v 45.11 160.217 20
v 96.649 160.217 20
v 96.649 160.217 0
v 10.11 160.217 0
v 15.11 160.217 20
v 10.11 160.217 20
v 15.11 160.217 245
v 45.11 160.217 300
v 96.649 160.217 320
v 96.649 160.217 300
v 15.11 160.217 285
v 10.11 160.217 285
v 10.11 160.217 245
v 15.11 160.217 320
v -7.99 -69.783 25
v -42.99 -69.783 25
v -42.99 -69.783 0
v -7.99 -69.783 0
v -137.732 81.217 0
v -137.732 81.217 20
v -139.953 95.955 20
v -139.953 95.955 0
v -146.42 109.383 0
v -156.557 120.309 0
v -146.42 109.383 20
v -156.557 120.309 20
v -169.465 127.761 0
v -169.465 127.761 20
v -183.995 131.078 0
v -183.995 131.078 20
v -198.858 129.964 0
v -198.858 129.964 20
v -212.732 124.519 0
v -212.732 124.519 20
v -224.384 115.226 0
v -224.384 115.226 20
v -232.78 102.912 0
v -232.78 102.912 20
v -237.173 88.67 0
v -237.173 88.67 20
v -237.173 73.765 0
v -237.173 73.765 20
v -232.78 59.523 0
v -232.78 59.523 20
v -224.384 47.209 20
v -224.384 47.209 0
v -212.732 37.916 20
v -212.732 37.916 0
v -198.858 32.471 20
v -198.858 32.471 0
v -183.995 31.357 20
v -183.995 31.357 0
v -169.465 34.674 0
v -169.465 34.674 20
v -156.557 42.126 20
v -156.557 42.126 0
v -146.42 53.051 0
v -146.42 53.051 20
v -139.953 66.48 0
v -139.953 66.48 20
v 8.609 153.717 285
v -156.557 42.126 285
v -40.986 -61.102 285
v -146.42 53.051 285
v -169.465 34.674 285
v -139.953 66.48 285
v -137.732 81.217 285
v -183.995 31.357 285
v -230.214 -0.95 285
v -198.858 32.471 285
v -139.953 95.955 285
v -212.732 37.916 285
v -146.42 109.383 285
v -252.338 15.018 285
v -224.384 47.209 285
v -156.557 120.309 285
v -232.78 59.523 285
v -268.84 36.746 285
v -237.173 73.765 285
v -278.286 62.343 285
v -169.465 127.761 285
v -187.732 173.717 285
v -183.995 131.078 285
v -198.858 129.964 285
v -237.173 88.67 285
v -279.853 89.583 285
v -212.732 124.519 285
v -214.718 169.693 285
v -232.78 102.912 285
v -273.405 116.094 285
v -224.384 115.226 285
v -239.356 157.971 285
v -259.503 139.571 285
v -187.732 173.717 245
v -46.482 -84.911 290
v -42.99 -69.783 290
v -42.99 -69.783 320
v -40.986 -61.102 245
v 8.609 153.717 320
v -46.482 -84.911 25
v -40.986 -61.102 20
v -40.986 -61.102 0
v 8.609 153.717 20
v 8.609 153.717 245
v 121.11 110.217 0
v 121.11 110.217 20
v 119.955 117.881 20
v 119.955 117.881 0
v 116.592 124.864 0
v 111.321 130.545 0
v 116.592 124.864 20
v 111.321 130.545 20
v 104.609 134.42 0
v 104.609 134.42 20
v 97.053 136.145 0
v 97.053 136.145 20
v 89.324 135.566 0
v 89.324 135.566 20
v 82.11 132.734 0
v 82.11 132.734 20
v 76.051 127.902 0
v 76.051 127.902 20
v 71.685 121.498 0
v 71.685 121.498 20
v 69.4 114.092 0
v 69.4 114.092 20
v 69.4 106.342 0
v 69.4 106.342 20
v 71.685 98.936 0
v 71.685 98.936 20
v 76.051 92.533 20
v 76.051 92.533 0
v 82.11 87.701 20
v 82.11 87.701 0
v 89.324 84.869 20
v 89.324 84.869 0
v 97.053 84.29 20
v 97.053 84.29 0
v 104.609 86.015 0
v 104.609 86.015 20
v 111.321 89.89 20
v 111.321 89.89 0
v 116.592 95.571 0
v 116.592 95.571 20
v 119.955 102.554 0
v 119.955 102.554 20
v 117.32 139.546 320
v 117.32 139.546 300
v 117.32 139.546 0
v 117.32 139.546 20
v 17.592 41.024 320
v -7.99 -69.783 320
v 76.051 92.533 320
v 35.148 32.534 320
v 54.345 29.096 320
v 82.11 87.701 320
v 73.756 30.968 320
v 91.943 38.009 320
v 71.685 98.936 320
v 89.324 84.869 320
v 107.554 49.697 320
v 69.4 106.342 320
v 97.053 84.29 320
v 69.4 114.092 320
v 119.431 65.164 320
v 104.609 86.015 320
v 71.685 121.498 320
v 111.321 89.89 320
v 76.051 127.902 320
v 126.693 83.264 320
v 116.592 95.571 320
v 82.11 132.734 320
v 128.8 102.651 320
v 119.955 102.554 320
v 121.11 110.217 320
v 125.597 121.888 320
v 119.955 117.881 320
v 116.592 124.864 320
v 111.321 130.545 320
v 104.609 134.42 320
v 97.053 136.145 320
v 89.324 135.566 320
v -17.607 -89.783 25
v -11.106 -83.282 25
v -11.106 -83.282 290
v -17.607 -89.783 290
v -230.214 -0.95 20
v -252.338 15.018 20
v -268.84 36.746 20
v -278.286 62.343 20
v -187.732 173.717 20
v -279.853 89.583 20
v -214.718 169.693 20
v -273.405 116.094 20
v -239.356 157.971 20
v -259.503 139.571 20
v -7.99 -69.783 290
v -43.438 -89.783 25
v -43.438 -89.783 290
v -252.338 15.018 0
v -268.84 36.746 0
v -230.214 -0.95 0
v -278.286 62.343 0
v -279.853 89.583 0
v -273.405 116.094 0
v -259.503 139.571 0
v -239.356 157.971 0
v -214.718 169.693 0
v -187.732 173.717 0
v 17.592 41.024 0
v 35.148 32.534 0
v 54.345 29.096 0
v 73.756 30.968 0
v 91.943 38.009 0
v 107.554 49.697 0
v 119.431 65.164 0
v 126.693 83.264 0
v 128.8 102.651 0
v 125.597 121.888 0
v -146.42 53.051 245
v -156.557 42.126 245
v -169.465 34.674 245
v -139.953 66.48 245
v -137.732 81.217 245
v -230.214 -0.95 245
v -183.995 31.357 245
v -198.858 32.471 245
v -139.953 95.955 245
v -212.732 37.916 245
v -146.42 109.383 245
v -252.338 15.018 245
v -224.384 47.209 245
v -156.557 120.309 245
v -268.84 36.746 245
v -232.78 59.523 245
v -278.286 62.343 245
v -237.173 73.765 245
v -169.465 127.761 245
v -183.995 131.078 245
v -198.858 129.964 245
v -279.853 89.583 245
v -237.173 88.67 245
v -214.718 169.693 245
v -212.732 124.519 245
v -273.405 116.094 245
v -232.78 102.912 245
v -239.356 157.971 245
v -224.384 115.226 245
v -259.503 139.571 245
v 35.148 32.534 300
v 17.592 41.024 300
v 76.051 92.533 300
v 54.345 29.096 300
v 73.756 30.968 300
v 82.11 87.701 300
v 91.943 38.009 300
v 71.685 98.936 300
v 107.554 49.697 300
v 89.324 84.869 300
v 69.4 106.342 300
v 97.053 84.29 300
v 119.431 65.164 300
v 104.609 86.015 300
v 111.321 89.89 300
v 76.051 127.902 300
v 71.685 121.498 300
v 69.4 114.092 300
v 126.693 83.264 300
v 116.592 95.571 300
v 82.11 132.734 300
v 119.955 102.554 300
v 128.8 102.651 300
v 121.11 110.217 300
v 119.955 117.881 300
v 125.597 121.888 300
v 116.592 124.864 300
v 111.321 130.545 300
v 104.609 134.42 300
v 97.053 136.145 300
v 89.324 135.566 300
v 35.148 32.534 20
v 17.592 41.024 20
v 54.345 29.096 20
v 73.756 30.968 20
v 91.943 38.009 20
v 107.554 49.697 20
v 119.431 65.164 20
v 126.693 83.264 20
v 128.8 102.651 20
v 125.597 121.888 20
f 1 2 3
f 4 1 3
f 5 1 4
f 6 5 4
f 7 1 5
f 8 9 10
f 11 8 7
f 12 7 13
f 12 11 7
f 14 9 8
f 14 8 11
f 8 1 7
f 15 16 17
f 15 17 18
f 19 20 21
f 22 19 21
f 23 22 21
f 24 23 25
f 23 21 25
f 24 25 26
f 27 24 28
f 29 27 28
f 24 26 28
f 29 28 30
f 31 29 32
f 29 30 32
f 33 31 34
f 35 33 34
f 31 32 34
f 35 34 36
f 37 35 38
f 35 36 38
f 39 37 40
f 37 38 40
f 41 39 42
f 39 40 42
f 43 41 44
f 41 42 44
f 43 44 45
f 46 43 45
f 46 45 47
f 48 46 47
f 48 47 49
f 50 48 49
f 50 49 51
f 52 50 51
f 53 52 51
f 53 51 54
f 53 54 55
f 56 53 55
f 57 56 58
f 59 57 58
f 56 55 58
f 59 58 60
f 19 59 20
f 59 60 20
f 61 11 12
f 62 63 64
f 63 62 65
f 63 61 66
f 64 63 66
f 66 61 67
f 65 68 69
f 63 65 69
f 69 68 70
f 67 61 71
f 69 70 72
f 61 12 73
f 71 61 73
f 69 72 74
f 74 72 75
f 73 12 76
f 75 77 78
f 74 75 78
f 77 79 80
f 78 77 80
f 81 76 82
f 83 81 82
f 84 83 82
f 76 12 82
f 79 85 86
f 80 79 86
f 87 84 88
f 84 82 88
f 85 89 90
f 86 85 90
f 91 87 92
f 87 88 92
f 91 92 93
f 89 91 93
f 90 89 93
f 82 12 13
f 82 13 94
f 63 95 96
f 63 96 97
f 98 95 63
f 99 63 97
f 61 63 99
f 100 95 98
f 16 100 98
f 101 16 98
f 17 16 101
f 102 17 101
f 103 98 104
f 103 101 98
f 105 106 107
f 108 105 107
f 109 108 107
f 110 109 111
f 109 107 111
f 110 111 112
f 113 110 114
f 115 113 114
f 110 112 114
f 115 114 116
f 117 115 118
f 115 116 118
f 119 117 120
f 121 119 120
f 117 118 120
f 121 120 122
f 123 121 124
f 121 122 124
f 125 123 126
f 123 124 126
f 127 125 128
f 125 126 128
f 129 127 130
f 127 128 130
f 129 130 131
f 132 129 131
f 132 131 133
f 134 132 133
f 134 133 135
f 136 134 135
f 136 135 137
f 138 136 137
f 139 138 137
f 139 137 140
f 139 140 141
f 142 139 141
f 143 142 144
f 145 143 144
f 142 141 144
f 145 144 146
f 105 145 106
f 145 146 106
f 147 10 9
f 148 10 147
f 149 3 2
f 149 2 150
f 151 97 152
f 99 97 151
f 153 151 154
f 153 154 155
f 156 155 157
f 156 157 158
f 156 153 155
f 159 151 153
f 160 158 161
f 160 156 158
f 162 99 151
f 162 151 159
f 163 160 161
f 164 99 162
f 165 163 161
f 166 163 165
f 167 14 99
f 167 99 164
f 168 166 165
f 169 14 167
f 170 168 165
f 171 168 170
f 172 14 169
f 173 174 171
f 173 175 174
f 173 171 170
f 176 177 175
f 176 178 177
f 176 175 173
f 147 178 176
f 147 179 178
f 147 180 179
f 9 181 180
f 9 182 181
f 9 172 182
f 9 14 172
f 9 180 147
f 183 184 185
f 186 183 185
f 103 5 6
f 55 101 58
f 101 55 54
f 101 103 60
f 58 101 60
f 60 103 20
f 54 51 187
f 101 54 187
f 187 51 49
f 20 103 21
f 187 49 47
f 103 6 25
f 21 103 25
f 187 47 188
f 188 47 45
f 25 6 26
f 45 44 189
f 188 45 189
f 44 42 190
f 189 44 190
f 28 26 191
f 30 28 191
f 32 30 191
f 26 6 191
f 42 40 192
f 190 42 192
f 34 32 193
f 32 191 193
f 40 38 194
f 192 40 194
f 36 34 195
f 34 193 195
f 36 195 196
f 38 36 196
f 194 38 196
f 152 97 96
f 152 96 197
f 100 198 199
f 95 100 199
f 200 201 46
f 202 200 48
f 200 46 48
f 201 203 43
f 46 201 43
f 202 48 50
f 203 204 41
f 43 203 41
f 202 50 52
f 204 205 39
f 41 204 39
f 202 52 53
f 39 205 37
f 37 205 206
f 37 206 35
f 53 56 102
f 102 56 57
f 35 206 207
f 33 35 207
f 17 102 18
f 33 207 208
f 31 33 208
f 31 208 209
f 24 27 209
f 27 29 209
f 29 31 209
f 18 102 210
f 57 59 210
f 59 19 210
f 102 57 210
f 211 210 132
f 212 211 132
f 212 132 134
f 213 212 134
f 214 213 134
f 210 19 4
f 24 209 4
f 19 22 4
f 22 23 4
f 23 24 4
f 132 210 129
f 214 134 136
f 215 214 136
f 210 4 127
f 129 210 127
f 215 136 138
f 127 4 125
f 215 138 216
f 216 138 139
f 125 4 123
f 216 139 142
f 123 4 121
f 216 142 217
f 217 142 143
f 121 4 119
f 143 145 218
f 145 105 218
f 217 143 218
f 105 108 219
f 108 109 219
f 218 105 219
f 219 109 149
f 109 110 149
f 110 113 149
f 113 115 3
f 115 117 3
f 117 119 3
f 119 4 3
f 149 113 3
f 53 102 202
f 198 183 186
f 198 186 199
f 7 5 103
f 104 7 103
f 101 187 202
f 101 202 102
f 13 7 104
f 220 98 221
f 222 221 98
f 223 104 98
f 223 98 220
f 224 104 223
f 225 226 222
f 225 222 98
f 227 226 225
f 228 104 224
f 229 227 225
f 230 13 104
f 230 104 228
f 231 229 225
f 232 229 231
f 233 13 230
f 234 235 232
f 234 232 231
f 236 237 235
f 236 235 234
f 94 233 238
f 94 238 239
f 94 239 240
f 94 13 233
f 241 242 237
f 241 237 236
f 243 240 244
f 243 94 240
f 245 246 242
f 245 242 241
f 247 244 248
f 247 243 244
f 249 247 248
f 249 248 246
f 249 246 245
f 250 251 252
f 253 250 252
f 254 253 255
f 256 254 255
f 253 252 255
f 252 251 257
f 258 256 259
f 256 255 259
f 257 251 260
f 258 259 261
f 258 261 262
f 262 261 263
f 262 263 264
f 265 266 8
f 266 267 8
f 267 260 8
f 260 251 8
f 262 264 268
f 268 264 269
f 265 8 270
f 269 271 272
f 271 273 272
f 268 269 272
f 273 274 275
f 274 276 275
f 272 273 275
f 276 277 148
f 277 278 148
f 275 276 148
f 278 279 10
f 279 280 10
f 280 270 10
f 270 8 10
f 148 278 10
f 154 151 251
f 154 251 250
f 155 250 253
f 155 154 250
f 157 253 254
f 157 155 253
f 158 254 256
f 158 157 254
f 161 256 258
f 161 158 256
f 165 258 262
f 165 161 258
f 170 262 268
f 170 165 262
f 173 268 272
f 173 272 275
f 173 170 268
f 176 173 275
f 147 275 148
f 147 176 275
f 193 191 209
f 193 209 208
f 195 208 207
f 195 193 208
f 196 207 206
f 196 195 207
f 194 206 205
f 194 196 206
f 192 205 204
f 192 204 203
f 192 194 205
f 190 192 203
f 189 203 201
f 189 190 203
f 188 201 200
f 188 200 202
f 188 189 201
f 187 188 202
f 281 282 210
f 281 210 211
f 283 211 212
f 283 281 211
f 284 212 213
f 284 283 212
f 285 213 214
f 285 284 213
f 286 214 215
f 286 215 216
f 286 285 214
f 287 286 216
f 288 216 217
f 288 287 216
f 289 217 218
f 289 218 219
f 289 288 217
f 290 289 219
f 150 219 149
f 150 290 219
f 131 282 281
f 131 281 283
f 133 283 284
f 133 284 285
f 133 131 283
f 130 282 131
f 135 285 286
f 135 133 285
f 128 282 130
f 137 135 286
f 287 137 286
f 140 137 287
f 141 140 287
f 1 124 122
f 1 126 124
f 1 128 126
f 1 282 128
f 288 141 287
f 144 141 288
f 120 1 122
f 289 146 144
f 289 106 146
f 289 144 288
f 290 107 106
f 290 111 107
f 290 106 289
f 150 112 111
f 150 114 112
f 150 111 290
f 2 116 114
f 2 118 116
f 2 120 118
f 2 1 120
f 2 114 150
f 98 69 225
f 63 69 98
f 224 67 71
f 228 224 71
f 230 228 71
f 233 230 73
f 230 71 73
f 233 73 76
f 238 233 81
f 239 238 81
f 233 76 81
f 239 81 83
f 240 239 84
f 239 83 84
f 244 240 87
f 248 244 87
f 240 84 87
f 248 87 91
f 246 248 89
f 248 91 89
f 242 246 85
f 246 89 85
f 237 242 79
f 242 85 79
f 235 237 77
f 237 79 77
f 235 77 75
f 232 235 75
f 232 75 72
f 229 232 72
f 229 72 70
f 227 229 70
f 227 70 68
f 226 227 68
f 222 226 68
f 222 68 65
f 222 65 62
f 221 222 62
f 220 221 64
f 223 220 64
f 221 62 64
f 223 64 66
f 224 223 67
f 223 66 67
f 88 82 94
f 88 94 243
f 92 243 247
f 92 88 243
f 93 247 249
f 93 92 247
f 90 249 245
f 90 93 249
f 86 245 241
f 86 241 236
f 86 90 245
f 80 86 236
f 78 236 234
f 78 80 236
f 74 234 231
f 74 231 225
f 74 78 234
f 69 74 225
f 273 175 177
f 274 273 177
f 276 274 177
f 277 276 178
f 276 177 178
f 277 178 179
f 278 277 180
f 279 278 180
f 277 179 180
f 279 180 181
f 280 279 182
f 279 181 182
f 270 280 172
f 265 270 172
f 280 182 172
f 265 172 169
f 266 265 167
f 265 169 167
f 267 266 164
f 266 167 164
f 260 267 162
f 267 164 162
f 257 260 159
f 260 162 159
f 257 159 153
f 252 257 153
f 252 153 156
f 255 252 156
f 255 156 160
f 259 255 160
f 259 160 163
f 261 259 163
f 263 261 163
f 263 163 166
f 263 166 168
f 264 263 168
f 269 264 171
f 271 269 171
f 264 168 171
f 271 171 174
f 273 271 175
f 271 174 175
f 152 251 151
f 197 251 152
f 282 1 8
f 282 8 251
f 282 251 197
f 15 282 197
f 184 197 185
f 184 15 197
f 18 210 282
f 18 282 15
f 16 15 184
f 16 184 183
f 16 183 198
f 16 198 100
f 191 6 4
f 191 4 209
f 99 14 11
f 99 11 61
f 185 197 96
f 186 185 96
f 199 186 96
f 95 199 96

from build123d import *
from OCP.BRepFilletAPI import BRepFilletAPI_MakeChamfer

# Parameters (mm, degrees)
BOSS_EXTRU_1_DEPTH      = 320
ENL_V_MAT_EXTRU_1_DEPTH = 30
ENL_V_START             = -295
ENL_V_MAT_EXTRU_2_DEPTH = 25
ESQUISSE5_R             = 26
BOSS_EXTRU_2_DEPTH      = 20
BOSS_EXTRU_3_START      = -35
ESQUISSE5_3_R           = 50
BOSS_EXTRU_3_DEPTH      = 40
BOSS_EXTRU_4_START      = -300
ESQUISSE5_5_R           = 50
BOSS_EXTRU_4_DEPTH      = 20
BOSS_EXTRU_5_START      = -300
ESQUISSE5_6_R           = 26
BOSS_EXTRU_5_DEPTH      = 20
CHANFREIN1_SIZE         = 5
CHANFREIN1_SIZE_2       = 6.671835022
CHANFREIN2_SIZE         = 5
CHANFREIN2_SIZE2        = 6.671835022
CHANFREIN2_SIZE2_2      = 4.169025226
CHANFREIN5_START        = 181.632019665
CHANFREIN5_OUTLINE_W    = 32
CHANFREIN5_OUTLINE_H    = 22
CHANFREIN5_DEPTH        = 2.367980335
CHANFREIN6_START        = 181.632019665
CHANFREIN6_OUTLINE_W    = 32
CHANFREIN6_OUTLINE_H    = 22
CHANFREIN6_DEPTH        = 2.367980335


with BuildPart() as part:
    # Esquisse1 → Boss.-Extru.1 (new body)
    with BuildSketch(Plane.XY):
        Polygon((10.109909982, 160.217391304), (45.109909982, 160.217391304), (-12.607137799, -89.782608696), (-47.607137799, -89.782608696), align=None)
    extrude(amount=BOSS_EXTRU_1_DEPTH)

    # Esquisse2 → Enlèv. mat.-Extru.1 (cut)
    with BuildSketch(Plane.XY.offset(320)):
        Polygon((-47.607137799, -89.782608696), (-42.989773977, -69.782608696), (-7.989773977, -69.782608696), (-12.607137799, -89.782608696), align=None)
    extrude(amount=-ENL_V_MAT_EXTRU_1_DEPTH, mode=Mode.SUBTRACT)

    # Esquisse3 → Enlèv. mat.-Extru.2 (cut)
    with BuildSketch(Plane.XY.offset(320).offset(ENL_V_START)):
        Polygon((-47.607137799, -89.782608696), (-42.989773977, -69.782608696), (-7.989773977, -69.782608696), (-12.607137799, -89.782608696), align=None)
    extrude(amount=-ENL_V_MAT_EXTRU_2_DEPTH, mode=Mode.SUBTRACT)

    # Esquisse5 → Boss.-Extru.2 (add)
    with BuildSketch(Plane.XY.offset(320)):
        with BuildLine():
            Line((96.899074267, 160.217391304), (45.109909982, 160.217391304))
            Line((45.109909982, 160.217391304), (17.591978342, 41.024134293))
            ThreePointArc((17.591978342, 41.024134293), (116.84215481, 60.967214836), (96.899074267, 160.217391304))
        make_face()
        with Locations((95.109909982, 110.217391304)):
            Circle(ESQUISSE5_R, mode=Mode.SUBTRACT)
    extrude(amount=-BOSS_EXTRU_2_DEPTH)

    # Esquisse5<3> → Boss.-Extru.3 (add)
    with BuildSketch(Plane.XY.offset(320).offset(BOSS_EXTRU_3_START)):
        with BuildLine():
            Line((-230.213971145, -0.950262244), (-40.985726083, -61.102123595))
            Line((-40.985726083, -61.102123595), (10.109909982, 160.217391304))
            Line((10.109909982, 160.217391304), (-187.731895981, 173.717391304))
            ThreePointArc((-187.731895981, 173.717391304), (-277.611698921, 103.077652588), (-230.213971145, -0.950262244))
        make_face()
        with Locations((-187.731895981, 81.217391304)):
            Circle(ESQUISSE5_3_R, mode=Mode.SUBTRACT)
    extrude(amount=-BOSS_EXTRU_3_DEPTH)

    # Esquisse5<5> → Boss.-Extru.4 (add)
    with BuildSketch(Plane.XY.offset(320).offset(BOSS_EXTRU_4_START)):
        with BuildLine():
            Line((-230.213971145, -0.950262244), (-40.985726083, -61.102123595))
            Line((-40.985726083, -61.102123595), (10.109909982, 160.217391304))
            Line((10.109909982, 160.217391304), (-187.731895981, 173.717391304))
            ThreePointArc((-187.731895981, 173.717391304), (-277.611698921, 103.077652588), (-230.213971145, -0.950262244))
        make_face()
        with Locations((-187.731895981, 81.217391304)):
            Circle(ESQUISSE5_5_R, mode=Mode.SUBTRACT)
    extrude(amount=-BOSS_EXTRU_4_DEPTH)

    # Esquisse5<6> → Boss.-Extru.5 (add)
    with BuildSketch(Plane.XY.offset(320).offset(BOSS_EXTRU_5_START)):
        with BuildLine():
            Line((96.899074267, 160.217391304), (45.109909982, 160.217391304))
            Line((45.109909982, 160.217391304), (17.591978342, 41.024134293))
            ThreePointArc((17.591978342, 41.024134293), (116.84215481, 60.967214836), (96.899074267, 160.217391304))
        make_face()
        with Locations((95.109909982, 110.217391304)):
            Circle(ESQUISSE5_6_R, mode=Mode.SUBTRACT)
    extrude(amount=-BOSS_EXTRU_5_DEPTH)

    # Chanfrein1
    # the kernel refuses this chamfer: 6.671835022, 5 mm, written as the material it takes off along each edge
    with BuildSketch(Plane(origin=(10.109909982, 160.217391304, 20), x_dir=(1, 0, 0), z_dir=(0, 0, 1))) as chanfrein1_piece_1:
        Polygon((CHANFREIN1_SIZE, 0), (-CHANFREIN1_SIZE_2 * 0.224951054343, -CHANFREIN1_SIZE_2 * 0.974370064782), (0, 0), align=None)
    extrude(amount=225, mode=Mode.SUBTRACT)
    with BuildSketch(Plane(origin=(10.109909982, 160.217391304, 285), x_dir=(1, 0, 0), z_dir=(0, 0, 1))) as chanfrein1_piece_2:
        Polygon((CHANFREIN1_SIZE, 0), (-CHANFREIN1_SIZE_2 * 0.224951054343, -CHANFREIN1_SIZE_2 * 0.974370064782), (0, 0), align=None)
    extrude(amount=52.24901503, mode=Mode.SUBTRACT)

    # Chanfrein2: one chamfer whose edges measure the first distance from different faces: ONE call of the kernel's chamfer builder (chamfer() names one face for all edges)
    chanfrein2_edges_1 = [part.edges().sort_by_distance(p)[0] for p in [
        (-12.607137799, -89.782608696, 157.5),
    ]]
    chanfrein2_side_1 = [part.faces().sort_by_distance(p)[0] for p in [
        (-30.107137799, -89.782608696, 157.5),
    ]]
    chanfrein2_edges_2 = [part.edges().sort_by_distance(p)[0] for p in [
        (-47.607137799, -89.782608696, 157.5),
    ]]
    chanfrein2_side_2 = [part.faces().sort_by_distance(p)[0] for p in [
        (-19.722598228, 30.998601722, 155.760522115),
    ]]
    chanfrein2 = BRepFilletAPI_MakeChamfer(part.part.solid().wrapped)
    for e in chanfrein2_edges_1:
        chanfrein2.Add(CHANFREIN2_SIZE, CHANFREIN2_SIZE2, e.wrapped, chanfrein2_side_1[0].wrapped)  # the first distance lies on this face
    for e in chanfrein2_edges_2:
        chanfrein2.Add(CHANFREIN2_SIZE, CHANFREIN2_SIZE2_2, e.wrapped, chanfrein2_side_2[0].wrapped)  # the first distance lies on this face
    add(Compound.cast(chanfrein2.Shape()), mode=Mode.REPLACE)

    # Chanfrein5: read off the stored shape, not the designer's step
    # Chanfrein5 outline → Chanfrein5 (cut)
    with BuildSketch(Plane(origin=(0, 0, 0), x_dir=(0.7071067811865471, -0.707106781186548, 0), z_dir=(0.707106781186548, 0.707106781186547, 0)).offset(CHANFREIN5_START)):
        with Locations((-30, -310)):
            Rectangle(CHANFREIN5_OUTLINE_W, CHANFREIN5_OUTLINE_H)
    extrude(amount=CHANFREIN5_DEPTH, mode=Mode.SUBTRACT)

    # Chanfrein6: read off the stored shape, not the designer's step
    # Chanfrein6 outline → Chanfrein6 (cut)
    with BuildSketch(Plane(origin=(0, 0, 0), x_dir=(0.707106781186546, -0.707106781186549, 0), z_dir=(0.707106781186549, 0.707106781186546, 0)).offset(CHANFREIN6_START)):
        with Locations((-30, -10)):
            Rectangle(CHANFREIN6_OUTLINE_W, CHANFREIN6_OUTLINE_H)
    extrude(amount=CHANFREIN6_DEPTH, mode=Mode.SUBTRACT)


solid = part.part
